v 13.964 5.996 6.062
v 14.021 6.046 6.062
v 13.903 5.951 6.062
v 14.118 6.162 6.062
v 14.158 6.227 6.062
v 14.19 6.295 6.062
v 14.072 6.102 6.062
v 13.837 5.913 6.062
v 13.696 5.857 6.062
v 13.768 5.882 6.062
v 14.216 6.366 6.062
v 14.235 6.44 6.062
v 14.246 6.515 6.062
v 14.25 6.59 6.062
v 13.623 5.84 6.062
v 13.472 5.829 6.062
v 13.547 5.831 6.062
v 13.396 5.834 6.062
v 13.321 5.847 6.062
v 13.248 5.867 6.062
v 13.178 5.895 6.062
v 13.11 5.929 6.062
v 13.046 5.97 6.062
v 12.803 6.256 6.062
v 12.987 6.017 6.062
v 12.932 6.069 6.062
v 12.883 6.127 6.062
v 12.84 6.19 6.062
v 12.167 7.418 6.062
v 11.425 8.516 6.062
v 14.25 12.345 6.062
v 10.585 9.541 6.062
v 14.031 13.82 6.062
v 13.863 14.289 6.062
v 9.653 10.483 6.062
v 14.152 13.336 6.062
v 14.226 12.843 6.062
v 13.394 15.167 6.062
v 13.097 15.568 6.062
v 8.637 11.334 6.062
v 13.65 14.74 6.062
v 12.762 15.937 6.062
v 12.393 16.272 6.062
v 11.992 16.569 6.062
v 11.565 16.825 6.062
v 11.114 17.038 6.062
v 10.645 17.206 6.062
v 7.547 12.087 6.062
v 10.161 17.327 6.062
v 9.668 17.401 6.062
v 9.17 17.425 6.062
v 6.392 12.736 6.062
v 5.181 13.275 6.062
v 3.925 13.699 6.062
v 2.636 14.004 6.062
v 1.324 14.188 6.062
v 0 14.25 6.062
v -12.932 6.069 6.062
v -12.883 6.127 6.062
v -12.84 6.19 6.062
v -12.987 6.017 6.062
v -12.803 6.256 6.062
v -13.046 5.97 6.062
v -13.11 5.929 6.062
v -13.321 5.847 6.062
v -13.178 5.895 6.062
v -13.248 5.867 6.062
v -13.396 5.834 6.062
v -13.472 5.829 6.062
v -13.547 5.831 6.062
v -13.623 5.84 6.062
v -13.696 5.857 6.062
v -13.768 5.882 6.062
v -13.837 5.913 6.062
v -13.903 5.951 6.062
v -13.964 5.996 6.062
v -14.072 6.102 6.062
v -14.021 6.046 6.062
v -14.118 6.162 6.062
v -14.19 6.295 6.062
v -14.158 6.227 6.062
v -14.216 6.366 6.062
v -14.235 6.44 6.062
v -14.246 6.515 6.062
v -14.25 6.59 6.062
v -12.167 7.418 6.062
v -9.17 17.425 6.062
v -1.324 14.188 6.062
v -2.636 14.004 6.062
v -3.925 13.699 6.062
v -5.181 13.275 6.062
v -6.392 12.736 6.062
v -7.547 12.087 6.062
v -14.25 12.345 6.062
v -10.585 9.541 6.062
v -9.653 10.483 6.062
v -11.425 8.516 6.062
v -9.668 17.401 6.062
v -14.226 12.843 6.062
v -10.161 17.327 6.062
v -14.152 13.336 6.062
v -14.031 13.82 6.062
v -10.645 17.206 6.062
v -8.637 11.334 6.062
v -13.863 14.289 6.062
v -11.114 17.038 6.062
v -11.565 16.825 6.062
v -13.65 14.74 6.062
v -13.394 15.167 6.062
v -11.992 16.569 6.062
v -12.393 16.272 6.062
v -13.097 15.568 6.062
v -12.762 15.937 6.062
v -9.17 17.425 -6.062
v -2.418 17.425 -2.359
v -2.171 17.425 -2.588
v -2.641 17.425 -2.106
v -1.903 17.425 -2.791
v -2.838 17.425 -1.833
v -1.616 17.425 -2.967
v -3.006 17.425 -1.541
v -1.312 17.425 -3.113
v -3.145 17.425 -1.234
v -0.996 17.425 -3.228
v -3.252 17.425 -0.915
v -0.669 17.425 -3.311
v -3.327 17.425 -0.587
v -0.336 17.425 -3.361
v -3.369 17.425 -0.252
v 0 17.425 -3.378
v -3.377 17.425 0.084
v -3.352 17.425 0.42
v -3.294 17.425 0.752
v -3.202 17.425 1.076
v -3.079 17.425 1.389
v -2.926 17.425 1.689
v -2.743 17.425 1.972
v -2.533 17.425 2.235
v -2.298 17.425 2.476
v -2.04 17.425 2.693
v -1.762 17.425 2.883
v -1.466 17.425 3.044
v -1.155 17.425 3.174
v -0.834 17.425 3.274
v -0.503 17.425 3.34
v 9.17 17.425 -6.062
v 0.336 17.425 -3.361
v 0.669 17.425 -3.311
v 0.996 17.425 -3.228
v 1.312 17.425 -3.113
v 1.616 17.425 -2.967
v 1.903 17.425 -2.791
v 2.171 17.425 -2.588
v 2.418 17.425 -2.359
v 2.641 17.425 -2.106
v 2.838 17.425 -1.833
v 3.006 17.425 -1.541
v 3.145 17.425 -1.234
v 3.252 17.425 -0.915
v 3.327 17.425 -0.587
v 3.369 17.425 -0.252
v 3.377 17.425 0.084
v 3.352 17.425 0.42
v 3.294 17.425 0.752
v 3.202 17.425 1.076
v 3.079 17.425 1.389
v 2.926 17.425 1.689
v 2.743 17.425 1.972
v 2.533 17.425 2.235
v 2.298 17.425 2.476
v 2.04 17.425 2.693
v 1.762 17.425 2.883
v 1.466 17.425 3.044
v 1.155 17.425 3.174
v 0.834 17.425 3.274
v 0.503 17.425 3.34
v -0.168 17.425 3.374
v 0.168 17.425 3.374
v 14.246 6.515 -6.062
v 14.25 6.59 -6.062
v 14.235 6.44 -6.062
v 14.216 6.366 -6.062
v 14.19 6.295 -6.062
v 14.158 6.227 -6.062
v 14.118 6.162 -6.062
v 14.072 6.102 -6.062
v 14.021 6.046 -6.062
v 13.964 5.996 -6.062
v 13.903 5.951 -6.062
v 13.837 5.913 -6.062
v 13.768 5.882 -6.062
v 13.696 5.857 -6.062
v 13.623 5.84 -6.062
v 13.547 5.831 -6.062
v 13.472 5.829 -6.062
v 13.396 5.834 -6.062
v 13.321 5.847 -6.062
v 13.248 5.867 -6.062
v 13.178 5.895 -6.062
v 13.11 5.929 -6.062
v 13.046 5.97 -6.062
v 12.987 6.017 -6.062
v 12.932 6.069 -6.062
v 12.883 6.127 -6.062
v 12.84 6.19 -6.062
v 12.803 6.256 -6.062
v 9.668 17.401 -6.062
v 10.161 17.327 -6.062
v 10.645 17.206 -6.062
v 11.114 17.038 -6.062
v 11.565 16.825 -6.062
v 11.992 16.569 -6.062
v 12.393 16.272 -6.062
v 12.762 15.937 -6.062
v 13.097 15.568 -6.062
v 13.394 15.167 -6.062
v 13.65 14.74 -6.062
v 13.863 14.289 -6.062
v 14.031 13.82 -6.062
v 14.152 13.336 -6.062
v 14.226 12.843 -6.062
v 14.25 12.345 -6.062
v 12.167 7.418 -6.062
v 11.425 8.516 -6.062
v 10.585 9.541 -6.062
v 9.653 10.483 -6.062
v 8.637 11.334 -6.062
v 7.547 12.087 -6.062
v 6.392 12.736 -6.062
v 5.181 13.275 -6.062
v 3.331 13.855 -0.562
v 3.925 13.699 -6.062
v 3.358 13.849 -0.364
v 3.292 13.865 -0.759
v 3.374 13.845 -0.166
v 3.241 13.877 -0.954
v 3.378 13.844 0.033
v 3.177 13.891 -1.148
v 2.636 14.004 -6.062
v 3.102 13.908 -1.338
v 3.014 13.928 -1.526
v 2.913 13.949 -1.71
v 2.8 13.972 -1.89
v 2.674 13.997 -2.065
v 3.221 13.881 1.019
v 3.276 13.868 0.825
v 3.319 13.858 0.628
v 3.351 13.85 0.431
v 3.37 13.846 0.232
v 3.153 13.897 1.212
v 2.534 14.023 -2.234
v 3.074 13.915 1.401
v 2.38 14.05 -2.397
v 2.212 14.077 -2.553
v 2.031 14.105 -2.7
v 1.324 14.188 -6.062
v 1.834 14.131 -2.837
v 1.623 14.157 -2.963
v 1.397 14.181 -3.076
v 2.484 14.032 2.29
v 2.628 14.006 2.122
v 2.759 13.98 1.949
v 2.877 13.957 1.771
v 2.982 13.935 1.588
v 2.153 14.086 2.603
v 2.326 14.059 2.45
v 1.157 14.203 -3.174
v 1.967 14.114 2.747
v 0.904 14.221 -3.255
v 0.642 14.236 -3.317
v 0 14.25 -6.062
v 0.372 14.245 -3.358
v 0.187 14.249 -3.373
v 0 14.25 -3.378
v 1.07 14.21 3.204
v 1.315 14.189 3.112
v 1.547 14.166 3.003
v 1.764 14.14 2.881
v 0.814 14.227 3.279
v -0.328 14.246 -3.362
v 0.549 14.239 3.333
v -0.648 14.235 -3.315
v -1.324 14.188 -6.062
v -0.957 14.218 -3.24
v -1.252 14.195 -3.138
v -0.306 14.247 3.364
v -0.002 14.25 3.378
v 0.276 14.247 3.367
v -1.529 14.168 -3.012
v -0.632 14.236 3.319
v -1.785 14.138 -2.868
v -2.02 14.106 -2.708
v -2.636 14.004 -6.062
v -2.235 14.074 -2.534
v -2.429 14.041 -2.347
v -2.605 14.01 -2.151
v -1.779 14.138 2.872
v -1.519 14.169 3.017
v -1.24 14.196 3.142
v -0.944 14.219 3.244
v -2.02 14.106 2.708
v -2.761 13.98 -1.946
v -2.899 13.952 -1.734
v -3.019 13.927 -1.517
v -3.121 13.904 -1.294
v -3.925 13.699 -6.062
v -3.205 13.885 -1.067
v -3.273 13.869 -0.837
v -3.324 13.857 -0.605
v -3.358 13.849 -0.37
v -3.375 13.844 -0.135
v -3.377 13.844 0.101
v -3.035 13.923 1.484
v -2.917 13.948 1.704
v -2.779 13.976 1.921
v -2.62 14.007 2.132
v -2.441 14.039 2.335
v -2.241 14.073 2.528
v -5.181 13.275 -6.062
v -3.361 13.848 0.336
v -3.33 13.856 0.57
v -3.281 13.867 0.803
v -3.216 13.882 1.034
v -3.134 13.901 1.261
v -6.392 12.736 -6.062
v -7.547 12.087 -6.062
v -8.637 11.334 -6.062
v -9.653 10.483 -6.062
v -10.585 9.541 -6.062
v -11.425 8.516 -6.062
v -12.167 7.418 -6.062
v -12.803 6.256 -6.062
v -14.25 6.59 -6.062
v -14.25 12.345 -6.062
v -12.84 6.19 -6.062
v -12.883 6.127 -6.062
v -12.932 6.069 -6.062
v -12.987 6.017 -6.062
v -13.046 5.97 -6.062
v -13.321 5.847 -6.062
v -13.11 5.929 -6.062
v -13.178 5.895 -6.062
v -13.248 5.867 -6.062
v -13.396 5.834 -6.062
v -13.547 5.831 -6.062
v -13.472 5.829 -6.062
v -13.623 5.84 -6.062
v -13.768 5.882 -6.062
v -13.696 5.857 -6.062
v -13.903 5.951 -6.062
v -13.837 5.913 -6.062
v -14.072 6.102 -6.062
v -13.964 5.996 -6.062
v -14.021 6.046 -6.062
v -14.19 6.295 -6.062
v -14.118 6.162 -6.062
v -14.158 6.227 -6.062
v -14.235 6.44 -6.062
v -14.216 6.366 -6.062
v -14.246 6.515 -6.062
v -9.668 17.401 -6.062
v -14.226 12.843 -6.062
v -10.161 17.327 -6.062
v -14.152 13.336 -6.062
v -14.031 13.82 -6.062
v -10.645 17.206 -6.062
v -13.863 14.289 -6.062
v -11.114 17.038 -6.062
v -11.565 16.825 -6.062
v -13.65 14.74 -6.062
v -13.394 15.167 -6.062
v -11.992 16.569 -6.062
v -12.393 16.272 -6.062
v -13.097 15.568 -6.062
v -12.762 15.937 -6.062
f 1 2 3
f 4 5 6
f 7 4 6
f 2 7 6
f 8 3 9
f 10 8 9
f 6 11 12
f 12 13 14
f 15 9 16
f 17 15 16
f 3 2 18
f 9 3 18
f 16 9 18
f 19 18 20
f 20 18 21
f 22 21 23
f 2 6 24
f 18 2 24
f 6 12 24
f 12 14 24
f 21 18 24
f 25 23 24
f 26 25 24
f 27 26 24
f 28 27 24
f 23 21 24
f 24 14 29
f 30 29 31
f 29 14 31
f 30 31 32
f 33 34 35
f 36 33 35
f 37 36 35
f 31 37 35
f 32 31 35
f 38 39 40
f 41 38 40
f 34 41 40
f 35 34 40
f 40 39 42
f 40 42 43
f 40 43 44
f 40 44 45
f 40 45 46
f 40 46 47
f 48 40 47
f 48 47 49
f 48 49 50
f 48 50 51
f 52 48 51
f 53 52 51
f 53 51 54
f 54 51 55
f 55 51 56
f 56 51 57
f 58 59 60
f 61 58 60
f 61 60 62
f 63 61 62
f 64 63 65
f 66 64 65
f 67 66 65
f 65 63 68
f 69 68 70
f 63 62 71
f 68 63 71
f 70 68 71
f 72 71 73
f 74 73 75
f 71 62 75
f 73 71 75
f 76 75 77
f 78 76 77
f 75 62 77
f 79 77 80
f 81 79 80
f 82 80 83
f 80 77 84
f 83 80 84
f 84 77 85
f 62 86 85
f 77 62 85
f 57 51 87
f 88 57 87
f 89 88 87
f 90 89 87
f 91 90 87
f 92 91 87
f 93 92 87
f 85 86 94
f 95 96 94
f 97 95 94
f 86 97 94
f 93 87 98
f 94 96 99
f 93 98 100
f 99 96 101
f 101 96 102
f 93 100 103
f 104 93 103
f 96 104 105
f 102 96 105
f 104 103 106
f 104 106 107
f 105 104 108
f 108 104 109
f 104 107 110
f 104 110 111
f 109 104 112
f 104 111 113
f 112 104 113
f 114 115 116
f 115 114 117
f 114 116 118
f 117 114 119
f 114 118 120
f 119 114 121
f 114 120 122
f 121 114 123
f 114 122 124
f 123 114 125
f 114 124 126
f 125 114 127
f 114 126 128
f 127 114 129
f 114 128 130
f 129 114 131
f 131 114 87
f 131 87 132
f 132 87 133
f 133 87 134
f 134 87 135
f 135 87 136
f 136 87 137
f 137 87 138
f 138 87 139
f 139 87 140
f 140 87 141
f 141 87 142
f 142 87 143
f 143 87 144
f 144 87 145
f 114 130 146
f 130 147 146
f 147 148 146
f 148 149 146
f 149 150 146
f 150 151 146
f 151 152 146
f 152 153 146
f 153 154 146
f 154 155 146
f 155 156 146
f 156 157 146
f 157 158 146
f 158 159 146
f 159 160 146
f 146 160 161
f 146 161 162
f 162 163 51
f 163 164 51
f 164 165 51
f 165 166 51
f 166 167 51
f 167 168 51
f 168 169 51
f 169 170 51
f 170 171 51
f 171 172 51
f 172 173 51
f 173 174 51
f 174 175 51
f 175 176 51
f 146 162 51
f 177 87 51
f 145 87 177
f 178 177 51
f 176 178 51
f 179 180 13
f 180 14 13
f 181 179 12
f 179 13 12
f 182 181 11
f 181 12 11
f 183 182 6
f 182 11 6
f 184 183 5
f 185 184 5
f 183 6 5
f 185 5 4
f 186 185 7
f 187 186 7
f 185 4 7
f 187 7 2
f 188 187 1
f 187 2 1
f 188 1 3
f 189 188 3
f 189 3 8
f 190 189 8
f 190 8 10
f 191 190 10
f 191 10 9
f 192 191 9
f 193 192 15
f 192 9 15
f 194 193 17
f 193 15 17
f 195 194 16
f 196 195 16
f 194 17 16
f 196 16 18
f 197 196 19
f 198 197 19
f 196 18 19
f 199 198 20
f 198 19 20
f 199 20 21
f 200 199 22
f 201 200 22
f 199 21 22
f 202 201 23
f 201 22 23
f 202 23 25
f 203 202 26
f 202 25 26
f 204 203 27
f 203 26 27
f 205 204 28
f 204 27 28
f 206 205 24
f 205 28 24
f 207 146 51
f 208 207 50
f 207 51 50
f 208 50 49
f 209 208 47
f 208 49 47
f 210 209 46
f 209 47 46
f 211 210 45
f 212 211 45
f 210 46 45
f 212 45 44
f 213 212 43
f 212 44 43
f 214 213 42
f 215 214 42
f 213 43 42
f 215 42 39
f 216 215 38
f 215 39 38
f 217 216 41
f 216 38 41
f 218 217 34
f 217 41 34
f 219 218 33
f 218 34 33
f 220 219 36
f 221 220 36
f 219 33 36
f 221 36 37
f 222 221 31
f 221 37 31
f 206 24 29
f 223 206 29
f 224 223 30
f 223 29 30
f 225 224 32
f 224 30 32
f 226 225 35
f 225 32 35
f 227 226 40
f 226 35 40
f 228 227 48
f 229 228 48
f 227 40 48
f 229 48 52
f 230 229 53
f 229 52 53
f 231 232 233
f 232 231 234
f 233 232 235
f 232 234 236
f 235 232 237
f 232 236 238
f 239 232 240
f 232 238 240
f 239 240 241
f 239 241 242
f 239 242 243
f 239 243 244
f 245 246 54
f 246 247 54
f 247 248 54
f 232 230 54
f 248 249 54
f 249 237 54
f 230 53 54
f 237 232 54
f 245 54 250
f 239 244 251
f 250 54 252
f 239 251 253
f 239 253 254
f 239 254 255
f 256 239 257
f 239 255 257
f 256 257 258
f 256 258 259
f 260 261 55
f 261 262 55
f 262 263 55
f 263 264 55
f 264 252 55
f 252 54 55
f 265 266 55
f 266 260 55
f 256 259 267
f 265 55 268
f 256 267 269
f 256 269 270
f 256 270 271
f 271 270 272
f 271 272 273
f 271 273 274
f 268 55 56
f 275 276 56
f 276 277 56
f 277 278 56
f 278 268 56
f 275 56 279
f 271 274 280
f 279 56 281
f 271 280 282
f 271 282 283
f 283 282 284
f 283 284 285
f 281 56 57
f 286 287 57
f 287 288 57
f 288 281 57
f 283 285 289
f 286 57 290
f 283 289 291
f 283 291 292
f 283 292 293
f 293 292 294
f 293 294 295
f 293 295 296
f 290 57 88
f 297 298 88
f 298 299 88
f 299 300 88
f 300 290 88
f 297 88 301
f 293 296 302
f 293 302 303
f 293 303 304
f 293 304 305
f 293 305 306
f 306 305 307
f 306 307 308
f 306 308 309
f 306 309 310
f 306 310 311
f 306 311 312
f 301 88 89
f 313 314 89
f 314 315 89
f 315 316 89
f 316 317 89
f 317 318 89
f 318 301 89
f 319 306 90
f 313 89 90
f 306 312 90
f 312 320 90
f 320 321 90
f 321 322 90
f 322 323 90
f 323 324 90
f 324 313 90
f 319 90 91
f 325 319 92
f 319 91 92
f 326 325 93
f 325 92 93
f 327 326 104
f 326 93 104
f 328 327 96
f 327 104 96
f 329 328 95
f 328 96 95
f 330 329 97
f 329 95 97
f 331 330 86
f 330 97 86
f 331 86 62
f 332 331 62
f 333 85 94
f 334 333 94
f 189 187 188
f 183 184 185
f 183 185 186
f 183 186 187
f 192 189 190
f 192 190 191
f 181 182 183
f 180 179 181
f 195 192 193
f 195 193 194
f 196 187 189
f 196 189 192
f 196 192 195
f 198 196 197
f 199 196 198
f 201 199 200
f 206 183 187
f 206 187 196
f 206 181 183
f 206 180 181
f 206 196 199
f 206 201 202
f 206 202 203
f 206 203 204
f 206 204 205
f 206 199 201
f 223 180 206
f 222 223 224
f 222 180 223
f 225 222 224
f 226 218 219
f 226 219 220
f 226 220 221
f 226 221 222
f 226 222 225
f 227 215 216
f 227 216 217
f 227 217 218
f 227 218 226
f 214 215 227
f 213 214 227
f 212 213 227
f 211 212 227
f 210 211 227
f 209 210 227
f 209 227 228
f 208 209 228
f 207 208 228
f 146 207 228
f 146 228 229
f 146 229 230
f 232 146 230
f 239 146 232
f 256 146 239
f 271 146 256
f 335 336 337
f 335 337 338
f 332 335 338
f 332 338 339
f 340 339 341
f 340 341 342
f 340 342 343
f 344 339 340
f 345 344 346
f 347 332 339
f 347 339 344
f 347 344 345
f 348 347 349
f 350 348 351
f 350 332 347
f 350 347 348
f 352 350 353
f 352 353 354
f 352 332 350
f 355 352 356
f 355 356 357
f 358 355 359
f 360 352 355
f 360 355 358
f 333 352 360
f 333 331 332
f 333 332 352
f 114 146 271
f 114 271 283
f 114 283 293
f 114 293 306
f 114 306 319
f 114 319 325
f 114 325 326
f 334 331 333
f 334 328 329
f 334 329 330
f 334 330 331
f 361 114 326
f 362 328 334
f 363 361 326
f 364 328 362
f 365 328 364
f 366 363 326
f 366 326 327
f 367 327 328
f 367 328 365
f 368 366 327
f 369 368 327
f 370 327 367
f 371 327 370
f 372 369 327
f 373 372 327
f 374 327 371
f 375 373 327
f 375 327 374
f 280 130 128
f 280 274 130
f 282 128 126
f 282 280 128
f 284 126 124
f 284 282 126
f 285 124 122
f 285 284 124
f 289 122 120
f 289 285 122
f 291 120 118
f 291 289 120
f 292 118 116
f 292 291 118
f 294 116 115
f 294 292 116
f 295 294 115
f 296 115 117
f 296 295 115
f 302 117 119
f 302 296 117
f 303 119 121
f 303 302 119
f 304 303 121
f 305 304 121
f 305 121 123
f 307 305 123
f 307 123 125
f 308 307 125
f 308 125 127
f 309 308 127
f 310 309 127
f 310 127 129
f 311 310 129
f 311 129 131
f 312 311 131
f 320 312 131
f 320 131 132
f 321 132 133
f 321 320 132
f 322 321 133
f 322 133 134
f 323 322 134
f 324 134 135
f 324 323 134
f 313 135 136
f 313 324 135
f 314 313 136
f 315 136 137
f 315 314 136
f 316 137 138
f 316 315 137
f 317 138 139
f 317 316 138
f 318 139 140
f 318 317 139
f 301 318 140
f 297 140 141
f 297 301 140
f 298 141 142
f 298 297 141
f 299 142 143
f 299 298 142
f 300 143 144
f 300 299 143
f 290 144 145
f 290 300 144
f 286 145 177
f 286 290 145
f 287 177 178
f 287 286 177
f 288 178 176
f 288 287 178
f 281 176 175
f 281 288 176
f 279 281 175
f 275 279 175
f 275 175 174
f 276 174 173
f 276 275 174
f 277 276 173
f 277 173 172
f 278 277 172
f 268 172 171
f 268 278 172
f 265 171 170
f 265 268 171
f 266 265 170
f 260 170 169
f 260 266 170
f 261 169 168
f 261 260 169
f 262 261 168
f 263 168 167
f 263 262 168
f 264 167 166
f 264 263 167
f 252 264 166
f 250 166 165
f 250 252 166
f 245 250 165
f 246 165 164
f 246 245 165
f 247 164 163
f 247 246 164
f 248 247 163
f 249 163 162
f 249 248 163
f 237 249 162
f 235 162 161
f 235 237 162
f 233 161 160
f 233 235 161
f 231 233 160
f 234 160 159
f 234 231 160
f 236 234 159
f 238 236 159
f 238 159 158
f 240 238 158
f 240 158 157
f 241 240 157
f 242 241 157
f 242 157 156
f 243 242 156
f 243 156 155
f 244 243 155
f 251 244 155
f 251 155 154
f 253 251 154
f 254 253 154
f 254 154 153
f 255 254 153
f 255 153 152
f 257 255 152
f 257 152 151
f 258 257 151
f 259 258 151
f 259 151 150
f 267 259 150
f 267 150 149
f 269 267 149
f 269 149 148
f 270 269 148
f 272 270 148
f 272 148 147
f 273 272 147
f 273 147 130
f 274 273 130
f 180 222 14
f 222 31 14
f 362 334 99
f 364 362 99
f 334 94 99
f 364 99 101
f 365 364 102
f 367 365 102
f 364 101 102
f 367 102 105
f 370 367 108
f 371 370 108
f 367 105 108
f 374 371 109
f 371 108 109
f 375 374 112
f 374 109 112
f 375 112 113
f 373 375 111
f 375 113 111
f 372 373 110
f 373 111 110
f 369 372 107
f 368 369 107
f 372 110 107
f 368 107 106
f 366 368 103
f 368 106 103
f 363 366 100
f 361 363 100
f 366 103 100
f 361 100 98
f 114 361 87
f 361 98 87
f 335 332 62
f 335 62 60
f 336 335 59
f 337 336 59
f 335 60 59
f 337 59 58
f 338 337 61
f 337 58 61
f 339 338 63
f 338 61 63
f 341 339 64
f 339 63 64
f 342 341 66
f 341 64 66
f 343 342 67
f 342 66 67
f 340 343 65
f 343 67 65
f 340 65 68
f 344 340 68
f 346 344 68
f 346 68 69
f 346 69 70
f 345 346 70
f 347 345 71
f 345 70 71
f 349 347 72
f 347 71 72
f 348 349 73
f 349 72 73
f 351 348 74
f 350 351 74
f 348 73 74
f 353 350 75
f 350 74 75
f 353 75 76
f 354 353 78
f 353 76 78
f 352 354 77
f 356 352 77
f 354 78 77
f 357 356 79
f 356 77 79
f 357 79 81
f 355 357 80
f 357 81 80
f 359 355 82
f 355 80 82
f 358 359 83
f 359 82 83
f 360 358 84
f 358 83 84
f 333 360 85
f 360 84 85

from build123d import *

# Parameters (mm, degrees)
BOSS_EXTRUDE1_DEPTH     = 6.0625
CUT_EXTRUDE1_DEPTH      = 24.31195039566617
CUT_EXTRUDE1_DEPTH_BACK = 24.31195039566617
SKETCH3_R               = 3.3782


with BuildPart() as part:
    # Sketch2 → Boss-Extrude1 (new, symmetric)
    with BuildSketch(Plane.XY):
        with BuildLine():
            Line((-14.25, 6.590447632748479), (-14.25, 12.344999999999999))
            ThreePointArc((-14.25, 12.344999999999999), (-12.762102448427667, 15.937102448427664), (-9.170000000000002, 17.425000000000004))
            Line((-9.170000000000002, 17.425000000000004), (9.36e-15, 17.425))
            Line((9.36e-15, 17.425), (9.169999999999998, 17.424999999999997))
            ThreePointArc((9.169999999999998, 17.424999999999997), (12.762102448427658, 15.937102448427659), (14.25, 12.344999999999999))
            Line((14.25, 12.344999999999999), (14.249999999999998, 6.5904476327484804))
            ThreePointArc((14.249999999999998, 6.5904476327484804), (13.659677420444995, 5.848038807835043), (12.80335731414868, 6.255920514699297))
            ThreePointArc((12.80335731414868, 6.255920514699297), (7.547040236593919, 12.087377038350068), (9.54e-15, 14.25))
            ThreePointArc((9.54e-15, 14.25), (-7.547040236593908, 12.087377038350072), (-12.803357314148682, 6.255920514699296))
            ThreePointArc((-12.803357314148682, 6.255920514699296), (-13.659677420444993, 5.848038807835042), (-14.25, 6.590447632748479))
        make_face()
    extrude(amount=BOSS_EXTRUDE1_DEPTH, both=True)

    # Sketch3 → Cut-Extrude1 (cut, two sides: drawn at the far end of the back side and taken through both)
    with BuildSketch(Plane(origin=(0, 0, 0), x_dir=(1, 0, 0), z_dir=(0, 1, 0)).offset(-CUT_EXTRUDE1_DEPTH_BACK)):
        with Locations(Location((0, 0, 0), (0, 0, 90))):
            Circle(SKETCH3_R)
    extrude(amount=CUT_EXTRUDE1_DEPTH + CUT_EXTRUDE1_DEPTH_BACK, mode=Mode.SUBTRACT)


solid = part.part
